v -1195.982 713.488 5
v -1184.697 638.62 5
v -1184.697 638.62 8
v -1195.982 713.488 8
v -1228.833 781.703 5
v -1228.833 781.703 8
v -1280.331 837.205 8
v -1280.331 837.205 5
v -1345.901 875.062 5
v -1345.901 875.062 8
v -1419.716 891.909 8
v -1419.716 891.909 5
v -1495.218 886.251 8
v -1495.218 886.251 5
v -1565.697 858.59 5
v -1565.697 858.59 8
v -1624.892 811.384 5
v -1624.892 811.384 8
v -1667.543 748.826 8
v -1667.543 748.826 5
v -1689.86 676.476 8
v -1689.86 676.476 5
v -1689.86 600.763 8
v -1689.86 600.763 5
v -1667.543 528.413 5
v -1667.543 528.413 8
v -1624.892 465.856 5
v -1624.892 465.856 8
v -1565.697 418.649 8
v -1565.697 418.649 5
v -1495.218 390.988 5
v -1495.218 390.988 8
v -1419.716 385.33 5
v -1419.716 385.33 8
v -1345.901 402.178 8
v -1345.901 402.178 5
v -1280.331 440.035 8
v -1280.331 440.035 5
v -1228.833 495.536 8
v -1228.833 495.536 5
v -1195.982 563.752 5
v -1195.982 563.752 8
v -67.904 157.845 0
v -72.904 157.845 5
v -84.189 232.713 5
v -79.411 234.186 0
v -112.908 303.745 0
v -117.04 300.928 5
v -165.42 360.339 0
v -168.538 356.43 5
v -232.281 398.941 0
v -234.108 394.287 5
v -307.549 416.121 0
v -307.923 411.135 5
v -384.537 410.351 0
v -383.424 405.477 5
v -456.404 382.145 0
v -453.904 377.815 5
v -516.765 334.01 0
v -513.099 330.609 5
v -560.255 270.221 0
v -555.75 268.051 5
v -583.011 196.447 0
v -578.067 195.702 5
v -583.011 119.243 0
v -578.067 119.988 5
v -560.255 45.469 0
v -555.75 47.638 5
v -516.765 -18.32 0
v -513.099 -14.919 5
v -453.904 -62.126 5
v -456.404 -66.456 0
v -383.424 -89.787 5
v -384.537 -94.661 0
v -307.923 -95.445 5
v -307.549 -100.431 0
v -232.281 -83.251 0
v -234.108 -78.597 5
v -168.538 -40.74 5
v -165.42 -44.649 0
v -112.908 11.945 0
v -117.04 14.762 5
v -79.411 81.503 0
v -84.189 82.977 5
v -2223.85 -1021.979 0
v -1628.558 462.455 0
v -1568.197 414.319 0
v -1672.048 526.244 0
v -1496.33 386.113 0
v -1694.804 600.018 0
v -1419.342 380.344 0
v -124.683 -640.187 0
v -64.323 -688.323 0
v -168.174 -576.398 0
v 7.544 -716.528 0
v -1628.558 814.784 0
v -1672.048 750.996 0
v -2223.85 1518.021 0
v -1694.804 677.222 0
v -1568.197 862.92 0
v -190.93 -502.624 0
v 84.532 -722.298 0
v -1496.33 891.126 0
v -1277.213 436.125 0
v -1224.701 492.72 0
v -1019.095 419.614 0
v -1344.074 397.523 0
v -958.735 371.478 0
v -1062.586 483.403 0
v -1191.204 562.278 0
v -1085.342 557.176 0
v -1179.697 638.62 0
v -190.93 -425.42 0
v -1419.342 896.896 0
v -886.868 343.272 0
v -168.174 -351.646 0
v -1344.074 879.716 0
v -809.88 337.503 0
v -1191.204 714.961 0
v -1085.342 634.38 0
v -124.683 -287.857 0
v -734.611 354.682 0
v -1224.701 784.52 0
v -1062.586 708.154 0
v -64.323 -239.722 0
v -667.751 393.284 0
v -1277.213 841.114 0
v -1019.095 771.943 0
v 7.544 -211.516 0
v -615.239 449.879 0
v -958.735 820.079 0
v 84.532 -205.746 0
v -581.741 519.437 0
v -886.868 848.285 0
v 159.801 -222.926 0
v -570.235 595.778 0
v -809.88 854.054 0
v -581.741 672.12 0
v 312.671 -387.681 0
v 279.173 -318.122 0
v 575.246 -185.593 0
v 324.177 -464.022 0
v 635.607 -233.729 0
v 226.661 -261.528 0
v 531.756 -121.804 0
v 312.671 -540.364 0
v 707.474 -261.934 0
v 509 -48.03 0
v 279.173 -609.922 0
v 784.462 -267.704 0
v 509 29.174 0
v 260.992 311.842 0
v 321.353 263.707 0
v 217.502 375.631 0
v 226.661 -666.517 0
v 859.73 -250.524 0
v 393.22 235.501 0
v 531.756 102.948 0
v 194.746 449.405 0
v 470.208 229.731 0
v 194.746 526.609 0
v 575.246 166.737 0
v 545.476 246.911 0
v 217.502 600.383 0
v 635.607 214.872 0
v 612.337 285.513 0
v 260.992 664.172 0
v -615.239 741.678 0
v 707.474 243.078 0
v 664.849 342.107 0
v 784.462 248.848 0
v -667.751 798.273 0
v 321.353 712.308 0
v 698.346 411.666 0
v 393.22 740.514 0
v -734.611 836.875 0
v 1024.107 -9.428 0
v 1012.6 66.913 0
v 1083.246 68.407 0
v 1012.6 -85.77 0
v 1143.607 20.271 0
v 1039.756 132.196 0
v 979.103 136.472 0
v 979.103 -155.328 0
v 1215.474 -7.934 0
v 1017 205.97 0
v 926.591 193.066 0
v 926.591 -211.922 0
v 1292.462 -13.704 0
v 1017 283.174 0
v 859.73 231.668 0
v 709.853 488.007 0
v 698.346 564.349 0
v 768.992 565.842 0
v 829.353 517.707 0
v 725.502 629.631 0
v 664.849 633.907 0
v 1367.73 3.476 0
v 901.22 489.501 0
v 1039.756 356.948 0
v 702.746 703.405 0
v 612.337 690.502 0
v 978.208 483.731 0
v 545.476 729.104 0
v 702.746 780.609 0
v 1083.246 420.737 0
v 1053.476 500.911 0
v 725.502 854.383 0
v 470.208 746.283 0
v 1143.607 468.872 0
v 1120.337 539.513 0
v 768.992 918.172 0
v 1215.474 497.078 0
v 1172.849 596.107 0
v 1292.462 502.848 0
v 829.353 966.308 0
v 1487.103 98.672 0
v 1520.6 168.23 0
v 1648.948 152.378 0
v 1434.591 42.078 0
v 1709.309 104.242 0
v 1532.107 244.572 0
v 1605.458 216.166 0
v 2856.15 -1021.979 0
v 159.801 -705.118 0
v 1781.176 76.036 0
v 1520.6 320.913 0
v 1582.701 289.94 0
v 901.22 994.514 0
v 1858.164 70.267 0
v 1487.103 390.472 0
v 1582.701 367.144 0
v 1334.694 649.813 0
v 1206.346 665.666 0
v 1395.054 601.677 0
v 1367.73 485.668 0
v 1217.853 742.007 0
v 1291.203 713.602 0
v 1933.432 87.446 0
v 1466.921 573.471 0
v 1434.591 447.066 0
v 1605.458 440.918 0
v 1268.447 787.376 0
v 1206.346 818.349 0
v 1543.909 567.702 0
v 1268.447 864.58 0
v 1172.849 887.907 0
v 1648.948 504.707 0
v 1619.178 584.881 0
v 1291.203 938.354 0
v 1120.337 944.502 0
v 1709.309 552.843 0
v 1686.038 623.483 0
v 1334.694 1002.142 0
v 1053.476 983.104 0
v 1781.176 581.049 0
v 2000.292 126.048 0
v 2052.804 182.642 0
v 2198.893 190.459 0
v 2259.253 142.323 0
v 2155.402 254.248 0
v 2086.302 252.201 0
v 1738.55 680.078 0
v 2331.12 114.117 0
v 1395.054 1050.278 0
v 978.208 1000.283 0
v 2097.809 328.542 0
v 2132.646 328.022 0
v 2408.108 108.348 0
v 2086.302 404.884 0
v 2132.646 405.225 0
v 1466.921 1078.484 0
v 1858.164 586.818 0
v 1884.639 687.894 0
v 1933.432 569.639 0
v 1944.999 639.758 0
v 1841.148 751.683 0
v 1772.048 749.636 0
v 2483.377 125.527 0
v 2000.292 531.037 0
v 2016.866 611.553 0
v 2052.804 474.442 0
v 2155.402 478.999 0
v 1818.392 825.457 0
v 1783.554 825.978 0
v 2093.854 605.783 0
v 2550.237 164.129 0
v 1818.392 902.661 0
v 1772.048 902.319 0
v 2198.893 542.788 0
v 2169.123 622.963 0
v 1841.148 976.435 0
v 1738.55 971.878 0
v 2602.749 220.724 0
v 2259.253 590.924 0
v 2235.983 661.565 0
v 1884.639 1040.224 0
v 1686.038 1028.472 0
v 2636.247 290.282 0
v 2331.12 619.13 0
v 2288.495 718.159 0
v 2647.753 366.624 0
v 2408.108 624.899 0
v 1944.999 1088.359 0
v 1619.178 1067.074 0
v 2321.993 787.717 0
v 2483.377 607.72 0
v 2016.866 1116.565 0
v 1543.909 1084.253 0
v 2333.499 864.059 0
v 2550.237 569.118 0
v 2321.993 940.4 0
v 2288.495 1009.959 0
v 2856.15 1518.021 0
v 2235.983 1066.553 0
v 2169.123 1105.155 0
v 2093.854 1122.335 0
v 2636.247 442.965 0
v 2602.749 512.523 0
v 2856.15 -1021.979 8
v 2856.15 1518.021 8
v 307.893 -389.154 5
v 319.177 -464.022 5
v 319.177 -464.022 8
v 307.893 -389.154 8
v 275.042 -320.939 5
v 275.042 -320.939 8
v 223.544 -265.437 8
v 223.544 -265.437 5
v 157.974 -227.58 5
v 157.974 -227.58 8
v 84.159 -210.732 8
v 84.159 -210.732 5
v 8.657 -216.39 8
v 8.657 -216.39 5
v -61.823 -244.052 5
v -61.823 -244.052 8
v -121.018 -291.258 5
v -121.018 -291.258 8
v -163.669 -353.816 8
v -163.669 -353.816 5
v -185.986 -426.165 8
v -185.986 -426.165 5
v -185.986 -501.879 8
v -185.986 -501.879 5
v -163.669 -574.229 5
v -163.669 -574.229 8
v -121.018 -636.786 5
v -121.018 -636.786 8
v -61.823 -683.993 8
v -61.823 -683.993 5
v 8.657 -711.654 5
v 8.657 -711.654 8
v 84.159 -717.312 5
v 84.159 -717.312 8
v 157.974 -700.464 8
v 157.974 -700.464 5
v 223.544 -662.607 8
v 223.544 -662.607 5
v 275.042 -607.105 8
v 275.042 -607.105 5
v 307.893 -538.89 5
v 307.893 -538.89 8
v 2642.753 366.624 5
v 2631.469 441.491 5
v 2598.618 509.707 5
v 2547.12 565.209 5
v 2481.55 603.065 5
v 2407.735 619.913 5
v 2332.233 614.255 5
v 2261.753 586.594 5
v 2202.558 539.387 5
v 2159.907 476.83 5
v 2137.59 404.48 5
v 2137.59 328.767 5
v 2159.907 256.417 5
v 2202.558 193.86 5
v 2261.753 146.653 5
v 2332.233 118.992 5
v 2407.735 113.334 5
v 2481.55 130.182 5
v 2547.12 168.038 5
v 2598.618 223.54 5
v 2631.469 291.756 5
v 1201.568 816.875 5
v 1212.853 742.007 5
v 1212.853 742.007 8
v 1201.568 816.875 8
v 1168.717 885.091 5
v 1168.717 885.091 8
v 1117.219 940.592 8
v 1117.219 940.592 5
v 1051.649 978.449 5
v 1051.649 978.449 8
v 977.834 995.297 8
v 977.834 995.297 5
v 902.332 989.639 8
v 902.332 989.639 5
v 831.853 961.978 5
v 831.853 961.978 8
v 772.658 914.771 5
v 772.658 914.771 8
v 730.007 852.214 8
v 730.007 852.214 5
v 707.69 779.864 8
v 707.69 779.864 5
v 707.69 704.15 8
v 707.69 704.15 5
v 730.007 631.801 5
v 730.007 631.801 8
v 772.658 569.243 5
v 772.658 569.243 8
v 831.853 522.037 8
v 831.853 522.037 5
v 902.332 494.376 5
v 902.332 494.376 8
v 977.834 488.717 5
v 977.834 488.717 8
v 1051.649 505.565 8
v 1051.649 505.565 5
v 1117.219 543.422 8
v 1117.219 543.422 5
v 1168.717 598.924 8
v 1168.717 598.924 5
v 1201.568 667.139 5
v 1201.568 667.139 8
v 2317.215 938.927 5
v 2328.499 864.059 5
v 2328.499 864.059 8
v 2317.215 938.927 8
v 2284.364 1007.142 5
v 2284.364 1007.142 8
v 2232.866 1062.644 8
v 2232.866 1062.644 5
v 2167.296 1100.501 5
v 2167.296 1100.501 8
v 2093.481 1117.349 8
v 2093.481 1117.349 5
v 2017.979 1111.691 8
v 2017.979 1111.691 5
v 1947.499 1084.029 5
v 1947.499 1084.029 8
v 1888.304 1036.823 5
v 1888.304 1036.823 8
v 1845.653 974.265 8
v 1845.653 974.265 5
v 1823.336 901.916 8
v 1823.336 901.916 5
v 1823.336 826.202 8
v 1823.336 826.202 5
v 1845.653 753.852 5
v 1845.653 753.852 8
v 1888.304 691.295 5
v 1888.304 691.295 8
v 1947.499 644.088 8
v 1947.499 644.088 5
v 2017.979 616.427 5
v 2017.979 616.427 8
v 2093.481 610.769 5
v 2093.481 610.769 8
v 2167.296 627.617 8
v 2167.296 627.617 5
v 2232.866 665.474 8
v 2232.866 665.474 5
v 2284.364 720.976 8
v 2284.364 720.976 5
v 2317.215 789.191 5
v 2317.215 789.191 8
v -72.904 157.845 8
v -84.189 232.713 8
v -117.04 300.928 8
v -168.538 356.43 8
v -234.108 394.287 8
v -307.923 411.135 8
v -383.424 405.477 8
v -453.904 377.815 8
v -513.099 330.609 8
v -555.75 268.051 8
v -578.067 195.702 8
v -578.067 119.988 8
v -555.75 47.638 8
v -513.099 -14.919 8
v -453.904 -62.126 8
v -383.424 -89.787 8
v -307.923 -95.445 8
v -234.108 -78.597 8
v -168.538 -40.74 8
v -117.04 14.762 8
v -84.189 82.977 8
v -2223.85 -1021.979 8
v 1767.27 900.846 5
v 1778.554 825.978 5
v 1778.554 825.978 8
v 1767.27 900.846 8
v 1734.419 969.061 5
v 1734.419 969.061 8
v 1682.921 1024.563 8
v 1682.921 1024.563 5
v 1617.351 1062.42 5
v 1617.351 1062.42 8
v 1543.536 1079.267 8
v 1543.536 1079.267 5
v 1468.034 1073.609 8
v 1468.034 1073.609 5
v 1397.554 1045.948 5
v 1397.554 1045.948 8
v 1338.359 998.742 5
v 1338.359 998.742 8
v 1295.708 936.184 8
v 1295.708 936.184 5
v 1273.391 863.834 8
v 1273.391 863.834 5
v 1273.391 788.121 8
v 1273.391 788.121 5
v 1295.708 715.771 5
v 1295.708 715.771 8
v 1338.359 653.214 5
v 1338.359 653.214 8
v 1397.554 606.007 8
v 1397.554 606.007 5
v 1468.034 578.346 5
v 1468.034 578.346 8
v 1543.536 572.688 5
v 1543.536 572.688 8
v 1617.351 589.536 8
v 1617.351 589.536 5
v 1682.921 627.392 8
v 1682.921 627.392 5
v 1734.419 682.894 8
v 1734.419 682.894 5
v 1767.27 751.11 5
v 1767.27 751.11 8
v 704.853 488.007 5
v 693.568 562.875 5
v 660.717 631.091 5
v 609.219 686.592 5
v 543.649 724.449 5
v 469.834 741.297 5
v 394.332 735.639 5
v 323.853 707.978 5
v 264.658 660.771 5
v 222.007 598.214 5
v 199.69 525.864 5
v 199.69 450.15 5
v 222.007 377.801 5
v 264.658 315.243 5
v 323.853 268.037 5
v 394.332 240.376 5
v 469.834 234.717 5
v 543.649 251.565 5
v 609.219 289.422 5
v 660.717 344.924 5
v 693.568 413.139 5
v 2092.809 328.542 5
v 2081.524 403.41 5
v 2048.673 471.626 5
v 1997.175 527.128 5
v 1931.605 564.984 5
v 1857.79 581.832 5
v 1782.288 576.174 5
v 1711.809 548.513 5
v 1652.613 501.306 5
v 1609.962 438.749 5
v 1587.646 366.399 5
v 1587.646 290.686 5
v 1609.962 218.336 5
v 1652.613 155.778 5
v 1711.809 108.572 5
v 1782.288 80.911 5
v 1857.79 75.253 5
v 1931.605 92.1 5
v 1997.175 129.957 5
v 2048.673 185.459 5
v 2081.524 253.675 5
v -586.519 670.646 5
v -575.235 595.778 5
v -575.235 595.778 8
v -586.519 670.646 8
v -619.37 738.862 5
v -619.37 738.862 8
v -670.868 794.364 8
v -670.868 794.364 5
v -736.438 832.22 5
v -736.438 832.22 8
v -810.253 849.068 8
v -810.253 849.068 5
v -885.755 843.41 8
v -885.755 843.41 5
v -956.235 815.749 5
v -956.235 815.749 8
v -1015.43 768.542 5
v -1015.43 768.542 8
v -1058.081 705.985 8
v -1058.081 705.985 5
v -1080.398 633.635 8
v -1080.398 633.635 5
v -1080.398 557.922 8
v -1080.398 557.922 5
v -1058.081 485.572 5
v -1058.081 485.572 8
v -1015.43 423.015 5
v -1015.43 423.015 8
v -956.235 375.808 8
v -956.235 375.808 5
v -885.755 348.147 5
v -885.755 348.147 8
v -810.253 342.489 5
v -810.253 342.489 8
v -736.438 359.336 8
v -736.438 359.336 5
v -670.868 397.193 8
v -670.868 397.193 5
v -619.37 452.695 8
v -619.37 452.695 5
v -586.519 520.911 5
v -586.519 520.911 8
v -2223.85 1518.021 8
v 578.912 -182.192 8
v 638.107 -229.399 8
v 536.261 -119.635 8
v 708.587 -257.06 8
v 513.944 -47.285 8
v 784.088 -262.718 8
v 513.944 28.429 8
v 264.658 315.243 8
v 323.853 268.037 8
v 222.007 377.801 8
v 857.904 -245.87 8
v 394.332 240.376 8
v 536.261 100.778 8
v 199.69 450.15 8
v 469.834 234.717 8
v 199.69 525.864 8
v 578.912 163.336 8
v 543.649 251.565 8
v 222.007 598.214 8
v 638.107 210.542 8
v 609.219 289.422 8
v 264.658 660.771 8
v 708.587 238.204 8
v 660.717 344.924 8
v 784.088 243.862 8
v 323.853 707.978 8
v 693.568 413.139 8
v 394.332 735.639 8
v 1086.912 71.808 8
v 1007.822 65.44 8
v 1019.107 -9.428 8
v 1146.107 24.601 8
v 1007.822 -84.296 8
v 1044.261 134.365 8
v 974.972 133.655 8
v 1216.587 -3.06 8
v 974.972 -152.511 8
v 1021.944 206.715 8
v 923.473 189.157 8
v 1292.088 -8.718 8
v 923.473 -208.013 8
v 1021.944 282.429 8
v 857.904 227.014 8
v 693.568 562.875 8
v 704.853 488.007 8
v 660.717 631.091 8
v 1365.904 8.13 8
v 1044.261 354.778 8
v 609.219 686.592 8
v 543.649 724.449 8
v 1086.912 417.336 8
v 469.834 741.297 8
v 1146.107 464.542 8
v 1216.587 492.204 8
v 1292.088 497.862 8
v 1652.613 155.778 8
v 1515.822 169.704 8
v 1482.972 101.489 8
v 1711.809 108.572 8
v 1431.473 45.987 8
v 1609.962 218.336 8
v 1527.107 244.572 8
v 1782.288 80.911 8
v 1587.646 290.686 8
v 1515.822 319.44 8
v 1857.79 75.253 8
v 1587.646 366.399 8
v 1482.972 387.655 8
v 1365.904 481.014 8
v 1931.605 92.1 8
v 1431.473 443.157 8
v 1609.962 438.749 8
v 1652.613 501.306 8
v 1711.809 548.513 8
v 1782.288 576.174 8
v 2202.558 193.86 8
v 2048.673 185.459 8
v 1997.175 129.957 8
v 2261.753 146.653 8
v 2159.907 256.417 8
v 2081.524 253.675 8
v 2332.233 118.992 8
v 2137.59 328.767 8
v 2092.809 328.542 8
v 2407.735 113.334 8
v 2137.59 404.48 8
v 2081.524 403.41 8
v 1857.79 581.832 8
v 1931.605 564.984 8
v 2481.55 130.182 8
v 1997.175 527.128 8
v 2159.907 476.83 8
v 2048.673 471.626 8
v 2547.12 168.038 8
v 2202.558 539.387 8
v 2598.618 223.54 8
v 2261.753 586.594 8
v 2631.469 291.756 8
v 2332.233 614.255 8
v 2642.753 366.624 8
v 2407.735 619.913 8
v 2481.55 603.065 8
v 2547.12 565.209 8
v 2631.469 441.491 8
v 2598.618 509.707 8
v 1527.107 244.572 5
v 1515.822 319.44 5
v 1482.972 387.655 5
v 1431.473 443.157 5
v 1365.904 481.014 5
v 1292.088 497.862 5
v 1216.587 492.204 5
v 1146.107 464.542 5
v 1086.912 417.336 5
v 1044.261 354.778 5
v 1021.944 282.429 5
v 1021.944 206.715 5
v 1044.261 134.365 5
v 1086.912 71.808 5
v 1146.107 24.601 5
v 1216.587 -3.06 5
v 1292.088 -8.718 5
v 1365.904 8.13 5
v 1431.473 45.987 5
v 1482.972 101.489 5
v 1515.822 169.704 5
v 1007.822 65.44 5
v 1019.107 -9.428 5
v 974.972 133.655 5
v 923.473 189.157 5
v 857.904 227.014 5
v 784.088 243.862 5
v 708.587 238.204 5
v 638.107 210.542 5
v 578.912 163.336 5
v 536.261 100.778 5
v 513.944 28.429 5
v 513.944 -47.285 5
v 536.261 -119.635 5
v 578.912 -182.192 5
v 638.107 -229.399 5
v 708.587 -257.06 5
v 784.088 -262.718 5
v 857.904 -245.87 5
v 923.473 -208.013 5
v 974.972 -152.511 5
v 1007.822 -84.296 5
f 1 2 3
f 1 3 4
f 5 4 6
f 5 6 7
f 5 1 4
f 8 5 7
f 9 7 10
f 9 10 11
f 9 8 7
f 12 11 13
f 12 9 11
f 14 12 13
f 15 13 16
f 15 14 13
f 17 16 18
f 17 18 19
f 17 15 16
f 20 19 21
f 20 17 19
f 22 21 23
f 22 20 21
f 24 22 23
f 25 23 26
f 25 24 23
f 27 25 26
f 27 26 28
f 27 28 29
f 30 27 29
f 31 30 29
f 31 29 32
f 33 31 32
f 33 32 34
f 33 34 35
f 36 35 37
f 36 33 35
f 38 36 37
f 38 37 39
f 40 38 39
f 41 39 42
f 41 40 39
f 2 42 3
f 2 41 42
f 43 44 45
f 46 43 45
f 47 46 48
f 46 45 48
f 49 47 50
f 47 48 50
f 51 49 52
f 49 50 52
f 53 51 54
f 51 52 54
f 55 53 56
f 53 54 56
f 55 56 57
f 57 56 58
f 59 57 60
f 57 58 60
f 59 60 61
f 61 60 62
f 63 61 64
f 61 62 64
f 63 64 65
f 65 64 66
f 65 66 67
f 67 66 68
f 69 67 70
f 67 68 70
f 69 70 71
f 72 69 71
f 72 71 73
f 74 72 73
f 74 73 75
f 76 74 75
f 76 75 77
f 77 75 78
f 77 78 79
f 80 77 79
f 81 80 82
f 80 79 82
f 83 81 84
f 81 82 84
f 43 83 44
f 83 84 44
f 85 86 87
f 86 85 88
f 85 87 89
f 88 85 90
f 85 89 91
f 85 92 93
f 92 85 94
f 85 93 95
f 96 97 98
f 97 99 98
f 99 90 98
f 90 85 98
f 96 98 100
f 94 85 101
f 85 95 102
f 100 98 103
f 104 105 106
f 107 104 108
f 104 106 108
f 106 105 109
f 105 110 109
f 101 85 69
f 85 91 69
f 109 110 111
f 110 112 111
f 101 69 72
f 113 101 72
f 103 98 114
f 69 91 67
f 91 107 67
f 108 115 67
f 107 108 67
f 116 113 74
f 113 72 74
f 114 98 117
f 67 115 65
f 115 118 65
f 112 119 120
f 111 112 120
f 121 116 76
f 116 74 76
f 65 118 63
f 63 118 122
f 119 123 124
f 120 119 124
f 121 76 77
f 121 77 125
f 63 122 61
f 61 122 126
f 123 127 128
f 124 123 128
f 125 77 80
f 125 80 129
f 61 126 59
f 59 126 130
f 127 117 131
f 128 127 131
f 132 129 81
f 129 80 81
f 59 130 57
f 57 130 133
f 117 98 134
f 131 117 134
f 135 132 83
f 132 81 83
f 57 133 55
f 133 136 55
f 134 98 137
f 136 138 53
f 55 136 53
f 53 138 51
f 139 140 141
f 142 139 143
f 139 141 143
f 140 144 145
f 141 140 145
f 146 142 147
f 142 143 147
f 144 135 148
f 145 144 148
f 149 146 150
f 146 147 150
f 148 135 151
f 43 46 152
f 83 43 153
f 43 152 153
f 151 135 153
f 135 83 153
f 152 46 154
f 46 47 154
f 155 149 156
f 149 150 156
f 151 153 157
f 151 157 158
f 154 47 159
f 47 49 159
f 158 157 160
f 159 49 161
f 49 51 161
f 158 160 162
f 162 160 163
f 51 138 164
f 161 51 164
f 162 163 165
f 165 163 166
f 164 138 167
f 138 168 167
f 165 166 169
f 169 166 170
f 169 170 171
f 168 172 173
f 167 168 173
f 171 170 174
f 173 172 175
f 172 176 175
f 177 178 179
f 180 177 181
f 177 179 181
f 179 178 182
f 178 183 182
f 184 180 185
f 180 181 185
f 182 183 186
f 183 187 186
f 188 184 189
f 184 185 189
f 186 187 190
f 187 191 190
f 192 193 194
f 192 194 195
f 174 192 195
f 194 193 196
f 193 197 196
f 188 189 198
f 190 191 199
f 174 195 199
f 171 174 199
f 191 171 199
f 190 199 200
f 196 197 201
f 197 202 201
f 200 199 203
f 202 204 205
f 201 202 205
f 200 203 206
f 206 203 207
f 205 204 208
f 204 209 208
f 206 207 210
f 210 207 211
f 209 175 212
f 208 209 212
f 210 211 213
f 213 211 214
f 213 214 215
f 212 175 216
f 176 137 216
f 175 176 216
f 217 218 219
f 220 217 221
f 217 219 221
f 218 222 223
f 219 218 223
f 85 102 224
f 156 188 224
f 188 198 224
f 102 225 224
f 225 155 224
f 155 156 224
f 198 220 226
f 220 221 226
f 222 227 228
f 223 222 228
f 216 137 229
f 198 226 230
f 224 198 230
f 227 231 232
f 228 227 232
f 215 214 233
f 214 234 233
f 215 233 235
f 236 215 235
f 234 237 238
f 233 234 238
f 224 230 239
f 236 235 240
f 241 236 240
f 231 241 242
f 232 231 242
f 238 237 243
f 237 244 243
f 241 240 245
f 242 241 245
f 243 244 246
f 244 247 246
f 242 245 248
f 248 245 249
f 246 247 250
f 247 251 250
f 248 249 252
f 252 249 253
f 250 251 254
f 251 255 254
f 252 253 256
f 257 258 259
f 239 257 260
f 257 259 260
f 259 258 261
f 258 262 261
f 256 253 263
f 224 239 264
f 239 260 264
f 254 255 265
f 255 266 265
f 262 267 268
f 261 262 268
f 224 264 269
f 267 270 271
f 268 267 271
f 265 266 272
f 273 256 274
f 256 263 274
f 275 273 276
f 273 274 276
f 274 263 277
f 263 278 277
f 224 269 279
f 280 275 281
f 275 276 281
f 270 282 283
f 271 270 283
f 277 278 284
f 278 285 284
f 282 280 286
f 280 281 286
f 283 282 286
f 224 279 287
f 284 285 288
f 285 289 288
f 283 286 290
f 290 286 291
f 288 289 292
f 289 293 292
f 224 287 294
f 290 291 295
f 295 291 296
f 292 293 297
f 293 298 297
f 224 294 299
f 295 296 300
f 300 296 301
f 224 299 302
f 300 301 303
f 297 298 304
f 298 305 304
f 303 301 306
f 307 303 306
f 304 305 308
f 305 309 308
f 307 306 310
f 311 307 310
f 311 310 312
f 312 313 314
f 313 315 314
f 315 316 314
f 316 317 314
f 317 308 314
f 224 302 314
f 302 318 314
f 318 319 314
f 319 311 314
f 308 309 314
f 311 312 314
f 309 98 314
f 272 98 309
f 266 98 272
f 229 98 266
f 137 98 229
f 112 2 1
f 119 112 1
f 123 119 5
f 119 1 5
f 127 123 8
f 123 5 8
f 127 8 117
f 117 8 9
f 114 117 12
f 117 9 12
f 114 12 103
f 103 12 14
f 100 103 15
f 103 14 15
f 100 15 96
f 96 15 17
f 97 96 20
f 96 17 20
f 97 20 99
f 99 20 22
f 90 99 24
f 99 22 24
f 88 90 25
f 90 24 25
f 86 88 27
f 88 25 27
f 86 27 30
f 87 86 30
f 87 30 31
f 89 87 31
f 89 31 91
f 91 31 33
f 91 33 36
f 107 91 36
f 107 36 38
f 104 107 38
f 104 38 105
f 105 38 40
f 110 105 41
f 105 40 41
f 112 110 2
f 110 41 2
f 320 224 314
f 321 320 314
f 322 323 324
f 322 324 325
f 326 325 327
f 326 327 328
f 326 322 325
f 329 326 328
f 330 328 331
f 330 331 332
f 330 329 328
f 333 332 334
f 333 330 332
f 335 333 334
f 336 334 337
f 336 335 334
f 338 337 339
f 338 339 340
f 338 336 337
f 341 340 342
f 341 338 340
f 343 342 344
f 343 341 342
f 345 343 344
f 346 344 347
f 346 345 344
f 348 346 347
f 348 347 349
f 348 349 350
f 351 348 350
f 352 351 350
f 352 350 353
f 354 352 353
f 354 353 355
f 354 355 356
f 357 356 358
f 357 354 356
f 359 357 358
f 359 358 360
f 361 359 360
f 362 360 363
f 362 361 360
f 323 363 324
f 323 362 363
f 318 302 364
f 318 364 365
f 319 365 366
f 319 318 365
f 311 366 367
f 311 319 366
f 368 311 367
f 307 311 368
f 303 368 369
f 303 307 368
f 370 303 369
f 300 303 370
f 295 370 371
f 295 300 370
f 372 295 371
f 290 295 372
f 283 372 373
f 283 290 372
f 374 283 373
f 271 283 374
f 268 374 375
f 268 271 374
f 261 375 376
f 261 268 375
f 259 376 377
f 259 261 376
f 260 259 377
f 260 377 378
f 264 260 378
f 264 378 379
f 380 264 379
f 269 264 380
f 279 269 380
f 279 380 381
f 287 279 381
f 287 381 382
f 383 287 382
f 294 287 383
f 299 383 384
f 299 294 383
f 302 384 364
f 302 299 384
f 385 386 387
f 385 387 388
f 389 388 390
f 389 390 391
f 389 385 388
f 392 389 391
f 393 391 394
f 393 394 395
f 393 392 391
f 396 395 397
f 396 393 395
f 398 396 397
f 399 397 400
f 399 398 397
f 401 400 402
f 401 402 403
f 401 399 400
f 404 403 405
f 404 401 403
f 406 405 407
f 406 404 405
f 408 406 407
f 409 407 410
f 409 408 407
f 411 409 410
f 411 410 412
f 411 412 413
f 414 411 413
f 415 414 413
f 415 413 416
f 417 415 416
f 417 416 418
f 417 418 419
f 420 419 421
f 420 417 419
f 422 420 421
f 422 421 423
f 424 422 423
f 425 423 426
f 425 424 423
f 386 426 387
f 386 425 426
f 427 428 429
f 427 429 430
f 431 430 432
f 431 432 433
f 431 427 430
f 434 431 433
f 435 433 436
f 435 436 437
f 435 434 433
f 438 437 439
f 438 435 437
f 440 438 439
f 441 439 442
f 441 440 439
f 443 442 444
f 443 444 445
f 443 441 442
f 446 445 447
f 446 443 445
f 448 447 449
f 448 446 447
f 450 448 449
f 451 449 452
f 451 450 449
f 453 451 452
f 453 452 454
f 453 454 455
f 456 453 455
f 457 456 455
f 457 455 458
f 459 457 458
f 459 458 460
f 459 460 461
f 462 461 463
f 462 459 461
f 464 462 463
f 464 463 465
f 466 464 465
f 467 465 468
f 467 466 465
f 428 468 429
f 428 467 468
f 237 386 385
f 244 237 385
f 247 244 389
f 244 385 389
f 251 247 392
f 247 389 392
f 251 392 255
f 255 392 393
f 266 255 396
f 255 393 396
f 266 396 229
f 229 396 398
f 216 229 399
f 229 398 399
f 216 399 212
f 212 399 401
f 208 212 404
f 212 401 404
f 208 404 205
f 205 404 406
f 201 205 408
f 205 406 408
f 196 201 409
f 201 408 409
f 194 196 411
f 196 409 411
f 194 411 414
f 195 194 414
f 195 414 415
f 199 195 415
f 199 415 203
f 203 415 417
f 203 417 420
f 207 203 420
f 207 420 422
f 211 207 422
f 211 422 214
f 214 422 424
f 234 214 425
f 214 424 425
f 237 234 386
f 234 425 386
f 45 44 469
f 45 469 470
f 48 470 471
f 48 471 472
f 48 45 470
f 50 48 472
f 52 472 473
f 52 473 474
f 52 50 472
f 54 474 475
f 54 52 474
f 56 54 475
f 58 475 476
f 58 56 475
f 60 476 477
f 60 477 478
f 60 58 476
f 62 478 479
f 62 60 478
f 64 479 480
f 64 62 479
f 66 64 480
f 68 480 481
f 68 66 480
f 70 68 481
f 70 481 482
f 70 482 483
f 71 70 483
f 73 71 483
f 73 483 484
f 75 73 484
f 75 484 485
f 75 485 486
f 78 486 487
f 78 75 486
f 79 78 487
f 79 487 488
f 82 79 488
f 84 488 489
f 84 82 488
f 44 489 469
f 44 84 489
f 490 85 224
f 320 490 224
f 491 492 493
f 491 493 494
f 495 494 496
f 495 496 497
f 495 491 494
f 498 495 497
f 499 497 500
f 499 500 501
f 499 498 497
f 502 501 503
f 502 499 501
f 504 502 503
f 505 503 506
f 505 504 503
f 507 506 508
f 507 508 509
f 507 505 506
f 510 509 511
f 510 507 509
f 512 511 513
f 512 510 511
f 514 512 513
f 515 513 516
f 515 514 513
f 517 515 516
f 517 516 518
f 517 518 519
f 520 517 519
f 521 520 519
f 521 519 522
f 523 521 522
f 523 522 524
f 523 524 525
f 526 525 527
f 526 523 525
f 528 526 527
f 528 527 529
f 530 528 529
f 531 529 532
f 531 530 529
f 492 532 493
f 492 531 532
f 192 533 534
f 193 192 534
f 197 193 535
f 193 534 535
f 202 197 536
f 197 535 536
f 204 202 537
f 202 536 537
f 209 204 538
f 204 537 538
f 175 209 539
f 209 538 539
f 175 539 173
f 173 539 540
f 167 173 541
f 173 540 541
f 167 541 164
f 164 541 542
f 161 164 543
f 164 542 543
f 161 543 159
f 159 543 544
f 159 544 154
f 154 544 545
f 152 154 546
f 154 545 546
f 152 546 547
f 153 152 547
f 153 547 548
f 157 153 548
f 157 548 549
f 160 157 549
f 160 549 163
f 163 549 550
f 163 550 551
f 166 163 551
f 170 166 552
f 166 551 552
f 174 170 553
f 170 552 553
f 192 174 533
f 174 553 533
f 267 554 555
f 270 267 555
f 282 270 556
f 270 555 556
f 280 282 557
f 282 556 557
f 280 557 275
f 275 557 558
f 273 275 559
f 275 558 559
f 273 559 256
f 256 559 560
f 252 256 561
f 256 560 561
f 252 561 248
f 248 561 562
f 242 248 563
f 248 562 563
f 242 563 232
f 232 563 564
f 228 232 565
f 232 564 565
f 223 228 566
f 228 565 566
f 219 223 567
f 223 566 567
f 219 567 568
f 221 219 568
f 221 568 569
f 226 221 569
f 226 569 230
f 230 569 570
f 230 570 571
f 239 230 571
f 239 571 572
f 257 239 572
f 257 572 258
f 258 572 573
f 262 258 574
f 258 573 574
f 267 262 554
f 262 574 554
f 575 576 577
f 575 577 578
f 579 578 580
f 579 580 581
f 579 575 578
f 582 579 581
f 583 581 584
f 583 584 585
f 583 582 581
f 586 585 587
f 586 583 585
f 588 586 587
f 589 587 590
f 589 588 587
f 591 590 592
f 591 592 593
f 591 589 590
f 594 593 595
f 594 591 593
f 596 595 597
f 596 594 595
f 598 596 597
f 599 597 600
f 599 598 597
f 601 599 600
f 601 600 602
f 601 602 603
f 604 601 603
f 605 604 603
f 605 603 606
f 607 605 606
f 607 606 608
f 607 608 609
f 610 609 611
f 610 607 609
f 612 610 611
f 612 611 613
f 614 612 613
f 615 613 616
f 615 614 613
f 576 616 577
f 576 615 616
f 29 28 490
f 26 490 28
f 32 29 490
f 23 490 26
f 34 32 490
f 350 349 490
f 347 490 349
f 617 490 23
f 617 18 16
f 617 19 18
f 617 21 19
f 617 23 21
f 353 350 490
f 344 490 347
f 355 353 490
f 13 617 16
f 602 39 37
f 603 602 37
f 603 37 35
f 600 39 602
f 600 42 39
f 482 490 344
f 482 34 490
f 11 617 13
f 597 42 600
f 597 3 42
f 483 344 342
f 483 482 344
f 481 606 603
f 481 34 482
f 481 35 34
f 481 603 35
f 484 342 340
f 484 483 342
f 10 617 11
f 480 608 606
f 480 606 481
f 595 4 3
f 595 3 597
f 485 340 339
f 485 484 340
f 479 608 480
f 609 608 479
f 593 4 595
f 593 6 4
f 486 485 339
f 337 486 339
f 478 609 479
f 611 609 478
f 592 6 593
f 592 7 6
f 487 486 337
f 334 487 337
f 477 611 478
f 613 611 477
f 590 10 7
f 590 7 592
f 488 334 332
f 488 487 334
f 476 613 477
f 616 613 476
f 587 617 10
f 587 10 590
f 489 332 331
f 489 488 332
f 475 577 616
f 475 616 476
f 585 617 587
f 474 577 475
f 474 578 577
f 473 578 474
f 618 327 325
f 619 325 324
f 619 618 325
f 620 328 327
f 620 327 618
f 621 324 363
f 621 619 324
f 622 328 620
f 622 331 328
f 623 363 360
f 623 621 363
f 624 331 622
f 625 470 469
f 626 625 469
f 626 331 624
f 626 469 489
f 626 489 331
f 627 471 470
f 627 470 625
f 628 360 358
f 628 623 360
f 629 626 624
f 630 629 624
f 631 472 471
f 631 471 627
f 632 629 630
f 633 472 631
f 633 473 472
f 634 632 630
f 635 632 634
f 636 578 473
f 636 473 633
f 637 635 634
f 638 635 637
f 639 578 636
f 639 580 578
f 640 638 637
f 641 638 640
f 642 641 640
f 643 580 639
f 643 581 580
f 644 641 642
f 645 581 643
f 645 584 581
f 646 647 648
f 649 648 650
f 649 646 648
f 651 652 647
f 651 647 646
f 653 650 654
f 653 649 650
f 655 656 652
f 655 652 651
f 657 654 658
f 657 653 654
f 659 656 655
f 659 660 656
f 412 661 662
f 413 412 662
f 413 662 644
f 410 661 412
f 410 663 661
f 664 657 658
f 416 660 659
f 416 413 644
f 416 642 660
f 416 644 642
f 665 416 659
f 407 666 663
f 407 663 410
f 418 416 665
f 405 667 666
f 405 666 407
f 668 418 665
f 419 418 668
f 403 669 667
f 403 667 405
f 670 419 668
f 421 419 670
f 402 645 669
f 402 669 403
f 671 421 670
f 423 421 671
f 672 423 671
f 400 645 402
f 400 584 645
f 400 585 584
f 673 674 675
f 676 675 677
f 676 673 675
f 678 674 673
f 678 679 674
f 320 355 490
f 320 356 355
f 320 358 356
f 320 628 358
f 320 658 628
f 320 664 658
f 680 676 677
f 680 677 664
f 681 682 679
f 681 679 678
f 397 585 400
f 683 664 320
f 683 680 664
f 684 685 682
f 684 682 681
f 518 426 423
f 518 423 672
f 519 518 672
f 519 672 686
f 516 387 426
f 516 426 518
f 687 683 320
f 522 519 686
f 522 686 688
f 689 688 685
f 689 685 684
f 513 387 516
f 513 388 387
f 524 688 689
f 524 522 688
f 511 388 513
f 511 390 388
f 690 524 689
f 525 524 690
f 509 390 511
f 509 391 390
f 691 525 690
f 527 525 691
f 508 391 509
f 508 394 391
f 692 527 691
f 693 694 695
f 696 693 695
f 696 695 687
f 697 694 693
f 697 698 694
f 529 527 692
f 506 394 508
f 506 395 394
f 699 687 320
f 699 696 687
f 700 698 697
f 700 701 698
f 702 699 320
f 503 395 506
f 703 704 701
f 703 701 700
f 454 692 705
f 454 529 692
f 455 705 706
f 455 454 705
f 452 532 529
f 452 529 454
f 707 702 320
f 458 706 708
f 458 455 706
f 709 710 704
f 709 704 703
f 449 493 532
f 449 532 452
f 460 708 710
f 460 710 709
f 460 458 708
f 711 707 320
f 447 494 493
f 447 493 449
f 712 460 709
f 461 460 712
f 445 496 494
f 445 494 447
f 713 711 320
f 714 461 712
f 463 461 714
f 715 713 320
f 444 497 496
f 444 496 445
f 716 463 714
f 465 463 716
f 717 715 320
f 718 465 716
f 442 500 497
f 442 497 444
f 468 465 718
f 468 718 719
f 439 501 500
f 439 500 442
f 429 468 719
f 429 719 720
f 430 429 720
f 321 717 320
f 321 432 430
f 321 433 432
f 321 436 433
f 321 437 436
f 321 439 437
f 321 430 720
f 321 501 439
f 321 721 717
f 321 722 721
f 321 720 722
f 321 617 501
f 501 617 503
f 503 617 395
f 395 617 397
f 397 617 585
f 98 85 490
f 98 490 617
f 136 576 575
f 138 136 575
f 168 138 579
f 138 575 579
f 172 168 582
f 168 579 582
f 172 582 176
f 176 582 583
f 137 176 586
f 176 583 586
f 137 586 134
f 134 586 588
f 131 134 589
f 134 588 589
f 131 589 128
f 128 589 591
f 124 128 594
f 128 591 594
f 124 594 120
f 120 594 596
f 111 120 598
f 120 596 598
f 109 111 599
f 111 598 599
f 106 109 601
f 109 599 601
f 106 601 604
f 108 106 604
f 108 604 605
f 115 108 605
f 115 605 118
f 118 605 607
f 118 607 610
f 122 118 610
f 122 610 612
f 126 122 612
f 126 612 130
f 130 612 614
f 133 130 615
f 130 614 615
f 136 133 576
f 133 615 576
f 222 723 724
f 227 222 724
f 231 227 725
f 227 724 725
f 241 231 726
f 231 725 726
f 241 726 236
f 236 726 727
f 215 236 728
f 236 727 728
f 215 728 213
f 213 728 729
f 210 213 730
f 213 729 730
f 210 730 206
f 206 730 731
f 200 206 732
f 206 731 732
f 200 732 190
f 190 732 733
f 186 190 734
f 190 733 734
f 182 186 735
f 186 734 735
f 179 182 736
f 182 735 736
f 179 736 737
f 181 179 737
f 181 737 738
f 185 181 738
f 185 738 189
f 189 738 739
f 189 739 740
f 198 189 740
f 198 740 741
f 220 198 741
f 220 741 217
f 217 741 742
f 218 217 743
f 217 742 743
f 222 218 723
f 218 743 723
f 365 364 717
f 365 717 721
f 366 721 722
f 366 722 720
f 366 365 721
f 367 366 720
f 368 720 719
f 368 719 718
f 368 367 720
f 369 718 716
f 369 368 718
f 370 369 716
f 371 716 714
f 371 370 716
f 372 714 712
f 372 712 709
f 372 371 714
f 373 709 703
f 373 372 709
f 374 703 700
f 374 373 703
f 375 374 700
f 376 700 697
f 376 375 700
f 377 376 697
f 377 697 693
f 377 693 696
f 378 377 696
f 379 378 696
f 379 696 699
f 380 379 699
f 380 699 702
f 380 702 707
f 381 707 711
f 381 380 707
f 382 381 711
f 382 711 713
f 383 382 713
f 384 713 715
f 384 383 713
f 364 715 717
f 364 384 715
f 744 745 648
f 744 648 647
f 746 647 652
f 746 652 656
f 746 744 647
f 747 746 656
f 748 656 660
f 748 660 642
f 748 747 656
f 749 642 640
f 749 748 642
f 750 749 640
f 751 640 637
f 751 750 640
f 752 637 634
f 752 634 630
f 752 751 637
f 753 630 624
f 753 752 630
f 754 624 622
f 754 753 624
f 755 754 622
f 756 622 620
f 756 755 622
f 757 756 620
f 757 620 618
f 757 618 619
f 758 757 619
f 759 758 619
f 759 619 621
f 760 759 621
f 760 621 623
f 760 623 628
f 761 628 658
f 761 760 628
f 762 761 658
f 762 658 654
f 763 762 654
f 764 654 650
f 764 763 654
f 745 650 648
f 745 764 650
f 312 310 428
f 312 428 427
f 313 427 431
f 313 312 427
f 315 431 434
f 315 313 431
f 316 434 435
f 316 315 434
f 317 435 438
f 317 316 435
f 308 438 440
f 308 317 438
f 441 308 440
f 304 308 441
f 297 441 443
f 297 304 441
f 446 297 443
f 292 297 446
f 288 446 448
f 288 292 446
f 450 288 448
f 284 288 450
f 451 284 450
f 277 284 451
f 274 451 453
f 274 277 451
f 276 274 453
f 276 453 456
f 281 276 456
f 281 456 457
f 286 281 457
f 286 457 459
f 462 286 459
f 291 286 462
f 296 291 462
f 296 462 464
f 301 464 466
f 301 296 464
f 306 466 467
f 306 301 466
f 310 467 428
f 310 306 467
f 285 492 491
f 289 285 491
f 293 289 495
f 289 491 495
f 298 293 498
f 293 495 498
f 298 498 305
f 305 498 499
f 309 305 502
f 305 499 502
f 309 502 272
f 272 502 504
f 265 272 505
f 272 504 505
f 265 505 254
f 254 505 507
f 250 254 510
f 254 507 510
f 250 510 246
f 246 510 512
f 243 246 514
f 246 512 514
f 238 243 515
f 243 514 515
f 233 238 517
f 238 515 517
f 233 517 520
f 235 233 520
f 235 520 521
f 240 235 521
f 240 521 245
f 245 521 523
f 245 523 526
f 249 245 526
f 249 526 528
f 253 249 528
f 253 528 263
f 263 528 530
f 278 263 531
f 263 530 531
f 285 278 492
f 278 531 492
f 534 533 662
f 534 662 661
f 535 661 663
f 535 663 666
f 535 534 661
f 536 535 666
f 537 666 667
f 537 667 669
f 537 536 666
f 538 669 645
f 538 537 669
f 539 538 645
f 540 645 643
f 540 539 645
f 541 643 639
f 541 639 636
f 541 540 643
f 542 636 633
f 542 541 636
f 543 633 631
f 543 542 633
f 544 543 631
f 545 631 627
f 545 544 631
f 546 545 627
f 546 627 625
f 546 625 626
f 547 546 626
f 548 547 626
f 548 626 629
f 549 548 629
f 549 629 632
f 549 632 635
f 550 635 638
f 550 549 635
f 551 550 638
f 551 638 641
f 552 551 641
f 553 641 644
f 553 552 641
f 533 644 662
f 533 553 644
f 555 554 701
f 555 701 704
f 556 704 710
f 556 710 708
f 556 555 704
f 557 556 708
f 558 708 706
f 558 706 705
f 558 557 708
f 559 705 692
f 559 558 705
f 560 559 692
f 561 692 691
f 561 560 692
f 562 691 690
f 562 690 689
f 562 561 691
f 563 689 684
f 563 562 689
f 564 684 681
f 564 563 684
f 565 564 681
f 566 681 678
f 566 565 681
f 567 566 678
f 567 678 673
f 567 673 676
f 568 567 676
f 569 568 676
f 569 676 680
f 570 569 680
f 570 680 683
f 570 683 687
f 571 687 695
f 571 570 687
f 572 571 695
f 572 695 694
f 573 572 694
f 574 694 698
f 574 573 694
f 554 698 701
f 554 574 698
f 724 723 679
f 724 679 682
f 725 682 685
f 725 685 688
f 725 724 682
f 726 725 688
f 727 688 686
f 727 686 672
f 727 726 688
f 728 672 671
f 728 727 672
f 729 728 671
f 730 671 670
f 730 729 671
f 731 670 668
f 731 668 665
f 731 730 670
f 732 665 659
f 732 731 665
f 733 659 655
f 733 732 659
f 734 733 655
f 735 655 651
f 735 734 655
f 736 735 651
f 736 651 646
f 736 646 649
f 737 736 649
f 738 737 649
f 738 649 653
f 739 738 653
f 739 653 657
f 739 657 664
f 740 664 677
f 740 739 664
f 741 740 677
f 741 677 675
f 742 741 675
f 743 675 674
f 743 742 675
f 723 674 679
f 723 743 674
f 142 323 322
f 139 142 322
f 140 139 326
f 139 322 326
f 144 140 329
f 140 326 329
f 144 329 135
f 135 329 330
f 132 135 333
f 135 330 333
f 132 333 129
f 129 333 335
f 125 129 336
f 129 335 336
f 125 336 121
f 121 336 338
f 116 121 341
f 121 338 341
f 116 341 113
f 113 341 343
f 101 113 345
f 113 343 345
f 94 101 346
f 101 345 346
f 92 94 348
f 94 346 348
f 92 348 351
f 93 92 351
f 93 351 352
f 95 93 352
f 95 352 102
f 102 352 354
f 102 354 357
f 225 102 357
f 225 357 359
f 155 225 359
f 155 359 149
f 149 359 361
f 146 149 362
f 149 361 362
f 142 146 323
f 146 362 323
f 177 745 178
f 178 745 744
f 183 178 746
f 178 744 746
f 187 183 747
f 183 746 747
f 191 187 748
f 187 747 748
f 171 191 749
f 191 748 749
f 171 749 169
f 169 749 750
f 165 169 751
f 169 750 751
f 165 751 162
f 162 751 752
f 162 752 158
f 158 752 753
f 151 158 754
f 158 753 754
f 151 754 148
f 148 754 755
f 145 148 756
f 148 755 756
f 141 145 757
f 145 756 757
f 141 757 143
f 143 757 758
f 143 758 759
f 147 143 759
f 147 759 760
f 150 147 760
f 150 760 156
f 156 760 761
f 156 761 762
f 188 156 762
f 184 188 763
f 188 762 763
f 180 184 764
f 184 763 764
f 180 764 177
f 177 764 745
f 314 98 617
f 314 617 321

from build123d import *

# Parameters (mm, degrees)
SKETCH1_W           = 5080
SKETCH1_H           = 2540
SKETCH1_R           = 254
BOSS_EXTRUDE1_DEPTH = 8
CHAMFER1_SIZE       = 5
CHAMFER2_SIZE       = 5


with BuildPart() as part:
    # Sketch1 → Boss-Extrude1 (new body)
    with BuildSketch(Plane.XY):
        with Locations((316.149762546, 248.021082972)):
            Rectangle(SKETCH1_W, SKETCH1_H)
        with Locations((-1438.697268441, 638.61973093)):
            Circle(SKETCH1_R, mode=Mode.SUBTRACT)
        with Locations((-829.234689967, 595.778397757)):
            Circle(SKETCH1_R, mode=Mode.SUBTRACT)
        with Locations((-326.904160186, 157.84489308)):
            Circle(SKETCH1_R, mode=Mode.SUBTRACT)
        with Locations((65.17720877, -464.022155912)):
            Circle(SKETCH1_R, mode=Mode.SUBTRACT)
        with Locations((450.852764313, 488.007227932)):
            Circle(SKETCH1_R, mode=Mode.SUBTRACT)
        with Locations((958.852764313, 742.007227932)):
            Circle(SKETCH1_R, mode=Mode.SUBTRACT)
        with Locations((1524.554395699, 825.977687935)):
            Circle(SKETCH1_R, mode=Mode.SUBTRACT)
        with Locations((2074.499177688, 864.058855361)):
            Circle(SKETCH1_R, mode=Mode.SUBTRACT)
        with Locations((765.106903992, -9.428110757)):
            Circle(SKETCH1_R, mode=Mode.SUBTRACT)
        with Locations((1273.106903992, 244.571889243)):
            Circle(SKETCH1_R, mode=Mode.SUBTRACT)
        with Locations((1838.808535378, 328.542349246)):
            Circle(SKETCH1_R, mode=Mode.SUBTRACT)
        with Locations((2388.753317367, 366.623516672)):
            Circle(SKETCH1_R, mode=Mode.SUBTRACT)
    extrude(amount=BOSS_EXTRUDE1_DEPTH)

    # Chamfer1
    chamfer1_edges = [part.edges().sort_by_distance(p)[0] for p in [
        (1820.499177688, 864.058855361, 0),
        (2134.753317367, 366.623516672, 0),
    ]]
    chamfer(chamfer1_edges, length=CHAMFER1_SIZE)

    # Chamfer2
    chamfer2_edges = [part.edges().sort_by_distance(p)[0] for p in [
        (-1692.697268441, 638.61973093, 0),
        (-1083.234689967, 595.778397757, 0),
        (-580.904160186, 157.84489308, 0),
        (-188.82279123, -464.022155912, 0),
        (196.852764313, 488.007227932, 0),
        (704.852764313, 742.007227932, 0),
        (1270.554395699, 825.977687935, 0),
        (511.106903992, -9.428110757, 0),
        (1019.106903992, 244.571889243, 0),
        (1584.808535378, 328.542349246, 0),
    ]]
    chamfer(chamfer2_edges, length=CHAMFER2_SIZE)


solid = part.part
